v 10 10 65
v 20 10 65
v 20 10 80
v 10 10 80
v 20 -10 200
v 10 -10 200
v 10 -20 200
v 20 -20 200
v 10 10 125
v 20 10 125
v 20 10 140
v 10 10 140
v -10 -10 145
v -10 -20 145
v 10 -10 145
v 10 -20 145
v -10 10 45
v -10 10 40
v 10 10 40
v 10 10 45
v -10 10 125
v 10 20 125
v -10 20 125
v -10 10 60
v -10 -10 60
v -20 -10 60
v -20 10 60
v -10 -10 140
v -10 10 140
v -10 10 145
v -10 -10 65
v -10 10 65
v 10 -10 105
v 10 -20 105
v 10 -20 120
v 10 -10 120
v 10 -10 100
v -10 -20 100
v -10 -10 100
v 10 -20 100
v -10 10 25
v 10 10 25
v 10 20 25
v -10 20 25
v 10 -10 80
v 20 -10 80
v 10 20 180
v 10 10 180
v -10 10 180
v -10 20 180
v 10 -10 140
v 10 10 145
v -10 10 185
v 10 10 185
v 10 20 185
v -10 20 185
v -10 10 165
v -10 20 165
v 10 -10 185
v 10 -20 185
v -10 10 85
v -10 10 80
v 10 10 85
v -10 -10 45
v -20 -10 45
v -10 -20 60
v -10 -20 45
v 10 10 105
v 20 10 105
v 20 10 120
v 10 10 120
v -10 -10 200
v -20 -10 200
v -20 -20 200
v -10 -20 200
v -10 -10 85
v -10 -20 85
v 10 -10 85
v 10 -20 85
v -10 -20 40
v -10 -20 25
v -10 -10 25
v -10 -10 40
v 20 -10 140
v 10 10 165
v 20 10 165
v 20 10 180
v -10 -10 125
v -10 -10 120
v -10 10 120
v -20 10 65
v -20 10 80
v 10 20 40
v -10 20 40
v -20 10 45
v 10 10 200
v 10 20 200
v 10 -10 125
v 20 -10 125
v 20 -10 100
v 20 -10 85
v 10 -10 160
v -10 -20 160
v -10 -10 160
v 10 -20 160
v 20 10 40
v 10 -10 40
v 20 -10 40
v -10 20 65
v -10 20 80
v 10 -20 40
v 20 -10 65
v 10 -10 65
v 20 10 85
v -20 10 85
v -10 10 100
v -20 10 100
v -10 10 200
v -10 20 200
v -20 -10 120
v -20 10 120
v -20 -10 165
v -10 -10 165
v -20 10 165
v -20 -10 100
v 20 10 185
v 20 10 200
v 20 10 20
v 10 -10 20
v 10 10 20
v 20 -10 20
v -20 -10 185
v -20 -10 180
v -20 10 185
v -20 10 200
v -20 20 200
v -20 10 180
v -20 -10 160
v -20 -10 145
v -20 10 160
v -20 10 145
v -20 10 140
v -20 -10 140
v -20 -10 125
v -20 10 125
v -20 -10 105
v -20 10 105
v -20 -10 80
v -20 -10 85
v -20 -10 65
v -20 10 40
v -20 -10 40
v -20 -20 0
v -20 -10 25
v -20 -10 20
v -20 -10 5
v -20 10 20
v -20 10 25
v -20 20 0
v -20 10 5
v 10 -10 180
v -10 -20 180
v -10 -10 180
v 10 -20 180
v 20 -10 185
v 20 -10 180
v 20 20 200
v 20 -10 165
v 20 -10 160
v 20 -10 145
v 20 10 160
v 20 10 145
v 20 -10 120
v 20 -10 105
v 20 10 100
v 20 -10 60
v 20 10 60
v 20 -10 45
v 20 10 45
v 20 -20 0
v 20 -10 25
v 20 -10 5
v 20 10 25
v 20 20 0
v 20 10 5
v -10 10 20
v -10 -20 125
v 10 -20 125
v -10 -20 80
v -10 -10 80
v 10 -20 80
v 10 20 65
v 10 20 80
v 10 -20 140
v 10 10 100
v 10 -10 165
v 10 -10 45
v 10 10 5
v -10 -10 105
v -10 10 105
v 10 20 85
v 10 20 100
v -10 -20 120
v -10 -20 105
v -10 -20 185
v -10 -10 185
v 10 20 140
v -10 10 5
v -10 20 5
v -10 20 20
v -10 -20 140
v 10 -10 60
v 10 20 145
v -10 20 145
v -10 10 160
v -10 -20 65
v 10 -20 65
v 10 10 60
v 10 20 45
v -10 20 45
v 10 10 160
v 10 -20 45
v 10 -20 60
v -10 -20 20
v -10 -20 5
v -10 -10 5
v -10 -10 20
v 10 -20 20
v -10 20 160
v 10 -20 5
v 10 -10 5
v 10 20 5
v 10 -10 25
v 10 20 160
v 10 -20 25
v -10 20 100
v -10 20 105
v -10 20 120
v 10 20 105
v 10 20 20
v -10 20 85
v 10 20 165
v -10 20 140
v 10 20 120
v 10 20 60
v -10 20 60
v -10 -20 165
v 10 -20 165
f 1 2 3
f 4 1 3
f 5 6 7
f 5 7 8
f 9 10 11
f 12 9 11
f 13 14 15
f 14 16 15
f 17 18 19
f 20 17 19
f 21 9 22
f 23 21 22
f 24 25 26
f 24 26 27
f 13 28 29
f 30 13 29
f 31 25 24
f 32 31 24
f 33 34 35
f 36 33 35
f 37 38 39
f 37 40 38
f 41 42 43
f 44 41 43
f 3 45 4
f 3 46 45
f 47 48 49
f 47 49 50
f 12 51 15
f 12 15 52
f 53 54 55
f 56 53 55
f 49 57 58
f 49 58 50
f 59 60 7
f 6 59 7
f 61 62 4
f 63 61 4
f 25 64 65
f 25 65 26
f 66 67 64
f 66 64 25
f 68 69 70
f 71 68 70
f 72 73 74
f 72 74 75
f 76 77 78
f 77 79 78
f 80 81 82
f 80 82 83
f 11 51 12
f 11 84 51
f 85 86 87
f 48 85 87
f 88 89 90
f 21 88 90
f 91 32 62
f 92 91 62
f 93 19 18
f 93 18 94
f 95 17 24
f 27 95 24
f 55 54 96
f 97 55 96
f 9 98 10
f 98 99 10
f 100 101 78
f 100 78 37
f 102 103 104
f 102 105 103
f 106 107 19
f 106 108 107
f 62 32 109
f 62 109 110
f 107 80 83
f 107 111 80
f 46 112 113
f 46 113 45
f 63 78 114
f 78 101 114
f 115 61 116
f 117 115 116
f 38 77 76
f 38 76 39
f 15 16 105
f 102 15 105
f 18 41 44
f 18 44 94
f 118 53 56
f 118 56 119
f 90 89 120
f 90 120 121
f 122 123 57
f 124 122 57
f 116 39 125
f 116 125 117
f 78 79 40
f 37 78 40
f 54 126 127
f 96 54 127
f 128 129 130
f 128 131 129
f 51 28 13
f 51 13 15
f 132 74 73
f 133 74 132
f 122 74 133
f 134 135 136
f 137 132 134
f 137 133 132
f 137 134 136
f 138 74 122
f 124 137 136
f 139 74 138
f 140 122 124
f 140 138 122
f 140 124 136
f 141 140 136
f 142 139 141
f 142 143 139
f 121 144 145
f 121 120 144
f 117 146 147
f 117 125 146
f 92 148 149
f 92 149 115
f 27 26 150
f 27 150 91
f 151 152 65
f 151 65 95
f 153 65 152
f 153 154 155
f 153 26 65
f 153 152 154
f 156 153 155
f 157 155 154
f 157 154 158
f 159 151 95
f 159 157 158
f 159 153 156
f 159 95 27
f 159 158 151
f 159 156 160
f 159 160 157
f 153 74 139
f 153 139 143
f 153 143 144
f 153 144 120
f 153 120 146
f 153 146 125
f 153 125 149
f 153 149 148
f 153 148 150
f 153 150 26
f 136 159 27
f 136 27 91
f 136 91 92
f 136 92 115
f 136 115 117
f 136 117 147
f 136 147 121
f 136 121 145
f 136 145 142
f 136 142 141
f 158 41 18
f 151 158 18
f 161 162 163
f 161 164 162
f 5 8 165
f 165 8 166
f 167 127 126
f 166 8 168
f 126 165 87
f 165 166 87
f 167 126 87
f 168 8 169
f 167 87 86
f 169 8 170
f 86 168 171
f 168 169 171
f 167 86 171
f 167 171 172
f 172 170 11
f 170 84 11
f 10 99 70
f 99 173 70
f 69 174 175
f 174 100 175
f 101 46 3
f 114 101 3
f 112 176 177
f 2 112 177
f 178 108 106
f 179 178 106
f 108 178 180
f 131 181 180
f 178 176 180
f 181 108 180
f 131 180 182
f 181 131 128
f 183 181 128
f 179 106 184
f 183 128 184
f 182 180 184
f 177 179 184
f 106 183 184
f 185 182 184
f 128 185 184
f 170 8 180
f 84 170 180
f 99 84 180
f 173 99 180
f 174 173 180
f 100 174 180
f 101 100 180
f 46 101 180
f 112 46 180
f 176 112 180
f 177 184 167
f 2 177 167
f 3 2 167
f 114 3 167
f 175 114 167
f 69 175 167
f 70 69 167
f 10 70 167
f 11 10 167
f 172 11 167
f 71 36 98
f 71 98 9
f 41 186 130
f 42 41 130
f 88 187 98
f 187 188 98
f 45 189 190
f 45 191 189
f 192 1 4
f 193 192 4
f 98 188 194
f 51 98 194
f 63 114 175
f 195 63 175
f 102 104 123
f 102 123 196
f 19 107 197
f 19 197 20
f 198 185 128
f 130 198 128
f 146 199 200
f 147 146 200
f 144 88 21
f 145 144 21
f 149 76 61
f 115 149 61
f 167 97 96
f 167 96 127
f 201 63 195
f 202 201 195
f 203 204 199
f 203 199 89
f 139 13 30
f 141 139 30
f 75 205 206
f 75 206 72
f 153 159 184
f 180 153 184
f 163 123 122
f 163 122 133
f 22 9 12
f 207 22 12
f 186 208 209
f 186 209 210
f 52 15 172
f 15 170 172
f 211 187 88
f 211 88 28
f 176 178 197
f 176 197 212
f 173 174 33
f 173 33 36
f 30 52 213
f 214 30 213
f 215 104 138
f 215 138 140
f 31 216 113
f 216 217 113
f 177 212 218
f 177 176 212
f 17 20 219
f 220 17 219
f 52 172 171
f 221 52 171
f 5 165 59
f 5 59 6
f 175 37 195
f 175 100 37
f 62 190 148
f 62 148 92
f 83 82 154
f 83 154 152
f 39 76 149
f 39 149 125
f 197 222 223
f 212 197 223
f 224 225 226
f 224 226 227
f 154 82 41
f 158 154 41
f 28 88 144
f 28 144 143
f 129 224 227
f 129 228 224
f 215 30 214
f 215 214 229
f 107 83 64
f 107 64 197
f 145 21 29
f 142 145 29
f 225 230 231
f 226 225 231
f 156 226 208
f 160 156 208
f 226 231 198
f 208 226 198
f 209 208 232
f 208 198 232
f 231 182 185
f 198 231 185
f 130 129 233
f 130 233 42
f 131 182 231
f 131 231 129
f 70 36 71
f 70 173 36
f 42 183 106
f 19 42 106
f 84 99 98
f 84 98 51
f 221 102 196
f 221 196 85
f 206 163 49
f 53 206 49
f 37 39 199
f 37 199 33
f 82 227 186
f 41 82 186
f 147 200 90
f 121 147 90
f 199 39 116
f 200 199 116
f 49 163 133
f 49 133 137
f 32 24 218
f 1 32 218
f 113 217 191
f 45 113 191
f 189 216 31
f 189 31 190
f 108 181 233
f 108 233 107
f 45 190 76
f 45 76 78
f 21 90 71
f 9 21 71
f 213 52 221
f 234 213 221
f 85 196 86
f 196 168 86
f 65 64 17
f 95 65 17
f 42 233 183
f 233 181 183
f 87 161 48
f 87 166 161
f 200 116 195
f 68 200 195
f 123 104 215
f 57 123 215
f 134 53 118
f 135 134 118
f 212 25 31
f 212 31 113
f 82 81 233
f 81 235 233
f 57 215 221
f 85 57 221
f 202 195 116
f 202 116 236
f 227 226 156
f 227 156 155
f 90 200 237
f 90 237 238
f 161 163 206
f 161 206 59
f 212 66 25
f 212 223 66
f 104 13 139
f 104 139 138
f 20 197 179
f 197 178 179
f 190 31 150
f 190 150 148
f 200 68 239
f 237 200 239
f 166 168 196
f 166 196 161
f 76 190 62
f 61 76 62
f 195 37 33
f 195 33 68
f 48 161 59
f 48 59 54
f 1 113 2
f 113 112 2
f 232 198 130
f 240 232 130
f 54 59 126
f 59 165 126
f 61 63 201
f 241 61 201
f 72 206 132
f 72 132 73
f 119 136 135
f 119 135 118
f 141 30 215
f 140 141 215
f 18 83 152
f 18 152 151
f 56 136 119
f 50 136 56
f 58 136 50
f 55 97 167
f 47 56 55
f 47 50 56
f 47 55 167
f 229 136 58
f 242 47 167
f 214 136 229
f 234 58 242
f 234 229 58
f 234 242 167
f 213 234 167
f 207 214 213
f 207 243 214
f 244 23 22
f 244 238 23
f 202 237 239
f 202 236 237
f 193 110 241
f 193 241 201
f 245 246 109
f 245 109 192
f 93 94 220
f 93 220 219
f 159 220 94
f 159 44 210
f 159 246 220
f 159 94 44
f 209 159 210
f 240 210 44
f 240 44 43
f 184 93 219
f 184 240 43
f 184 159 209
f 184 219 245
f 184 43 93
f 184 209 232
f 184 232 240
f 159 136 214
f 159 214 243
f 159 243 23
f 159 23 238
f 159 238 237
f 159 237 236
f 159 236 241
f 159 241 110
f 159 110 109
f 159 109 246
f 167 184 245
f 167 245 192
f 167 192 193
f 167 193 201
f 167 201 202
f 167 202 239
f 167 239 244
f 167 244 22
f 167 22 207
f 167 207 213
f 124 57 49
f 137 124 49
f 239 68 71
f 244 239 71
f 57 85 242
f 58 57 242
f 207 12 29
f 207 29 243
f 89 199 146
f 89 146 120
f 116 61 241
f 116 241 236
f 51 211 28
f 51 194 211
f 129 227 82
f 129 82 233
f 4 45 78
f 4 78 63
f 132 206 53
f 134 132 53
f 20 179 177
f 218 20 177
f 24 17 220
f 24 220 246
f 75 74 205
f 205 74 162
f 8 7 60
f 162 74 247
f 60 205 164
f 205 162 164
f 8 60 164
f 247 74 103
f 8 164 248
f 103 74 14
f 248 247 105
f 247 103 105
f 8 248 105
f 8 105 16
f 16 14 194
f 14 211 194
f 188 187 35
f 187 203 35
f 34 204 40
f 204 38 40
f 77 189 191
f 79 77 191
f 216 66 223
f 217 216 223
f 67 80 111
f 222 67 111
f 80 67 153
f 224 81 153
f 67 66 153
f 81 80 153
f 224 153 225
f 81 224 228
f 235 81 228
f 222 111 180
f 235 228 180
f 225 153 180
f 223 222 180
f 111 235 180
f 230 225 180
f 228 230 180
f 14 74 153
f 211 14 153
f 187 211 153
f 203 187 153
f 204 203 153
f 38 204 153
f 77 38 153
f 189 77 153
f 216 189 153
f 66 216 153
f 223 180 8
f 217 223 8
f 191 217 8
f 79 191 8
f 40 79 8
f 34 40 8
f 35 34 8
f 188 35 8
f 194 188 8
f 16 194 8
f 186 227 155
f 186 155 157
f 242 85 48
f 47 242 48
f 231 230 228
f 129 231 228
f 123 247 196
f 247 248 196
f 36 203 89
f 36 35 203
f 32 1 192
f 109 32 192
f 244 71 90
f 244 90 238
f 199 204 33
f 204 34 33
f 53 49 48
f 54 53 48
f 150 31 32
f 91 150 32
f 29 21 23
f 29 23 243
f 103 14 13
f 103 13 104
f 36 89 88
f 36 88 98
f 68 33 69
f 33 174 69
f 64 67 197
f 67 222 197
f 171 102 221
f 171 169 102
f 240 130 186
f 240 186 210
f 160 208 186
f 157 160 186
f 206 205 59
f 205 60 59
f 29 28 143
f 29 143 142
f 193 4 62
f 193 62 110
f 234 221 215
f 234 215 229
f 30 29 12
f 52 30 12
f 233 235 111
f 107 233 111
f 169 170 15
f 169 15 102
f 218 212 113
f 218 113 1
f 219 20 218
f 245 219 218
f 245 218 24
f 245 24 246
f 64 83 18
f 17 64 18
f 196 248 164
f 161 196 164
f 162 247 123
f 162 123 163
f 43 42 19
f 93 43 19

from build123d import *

# Parameters (mm, degrees)
F0_W     = 40
F0_H     = 40
F1_DEPTH = 200
F2_W     = 20
F2_H     = 15
F3_DEPTH = 40.001
F4_W     = 20
F4_H     = 15
F5_DEPTH = 40.001
F6_W     = 20
F6_H     = 20
F7_DEPTH = 195.001


with BuildPart() as f1:
    # F0 (on Top) → F1 (new body)
    with BuildSketch(Plane.XY):
        Rectangle(F0_W, F0_H)
    extrude(amount=F1_DEPTH)

    # F2 (on face) → F3 (cut, through all)
    with BuildSketch(Plane.YZ.offset(20)):
        with Locations((0, 12.5)):
            Rectangle(F2_W, F2_H)
        with Locations((0, 32.5)):
            Rectangle(F2_W, F2_H)
        with Locations((0, 52.5)):
            Rectangle(F2_W, F2_H)
        with Locations((0, 72.5)):
            Rectangle(F2_W, F2_H)
        with Locations((0, 92.5)):
            Rectangle(F2_W, F2_H)
        with Locations((0, 112.5)):
            Rectangle(F2_W, F2_H)
        with Locations((0, 132.5)):
            Rectangle(F2_W, F2_H)
        with Locations((0, 152.5)):
            Rectangle(F2_W, F2_H)
        with Locations((0, 172.5)):
            Rectangle(F2_W, F2_H)
        with Locations((0, 192.5)):
            Rectangle(F2_W, F2_H)
    extrude(amount=-F3_DEPTH, mode=Mode.SUBTRACT)

    # F4 (on face) → F5 (cut, through all)
    with BuildSketch(Plane.XZ.offset(20)):
        with Locations((0, 12.5)):
            Rectangle(F4_W, F4_H)
        with Locations((0, 32.5)):
            Rectangle(F4_W, F4_H)
        with Locations((0, 52.5)):
            Rectangle(F4_W, F4_H)
        with Locations((0, 72.5)):
            Rectangle(F4_W, F4_H)
        with Locations((0, 92.5)):
            Rectangle(F4_W, F4_H)
        with Locations((0, 112.5)):
            Rectangle(F4_W, F4_H)
        with Locations((0, 132.5)):
            Rectangle(F4_W, F4_H)
        with Locations((0, 152.5)):
            Rectangle(F4_W, F4_H)
        with Locations((0, 172.5)):
            Rectangle(F4_W, F4_H)
        with Locations((0, 192.5)):
            Rectangle(F4_W, F4_H)
    extrude(amount=-F5_DEPTH, mode=Mode.SUBTRACT)

    # F6 (on face) → F7 (cut, through all)
    with BuildSketch(Plane.XY.offset(5)):
        Rectangle(F6_W, F6_H)
    extrude(amount=F7_DEPTH, mode=Mode.SUBTRACT)


solid = f1.part
